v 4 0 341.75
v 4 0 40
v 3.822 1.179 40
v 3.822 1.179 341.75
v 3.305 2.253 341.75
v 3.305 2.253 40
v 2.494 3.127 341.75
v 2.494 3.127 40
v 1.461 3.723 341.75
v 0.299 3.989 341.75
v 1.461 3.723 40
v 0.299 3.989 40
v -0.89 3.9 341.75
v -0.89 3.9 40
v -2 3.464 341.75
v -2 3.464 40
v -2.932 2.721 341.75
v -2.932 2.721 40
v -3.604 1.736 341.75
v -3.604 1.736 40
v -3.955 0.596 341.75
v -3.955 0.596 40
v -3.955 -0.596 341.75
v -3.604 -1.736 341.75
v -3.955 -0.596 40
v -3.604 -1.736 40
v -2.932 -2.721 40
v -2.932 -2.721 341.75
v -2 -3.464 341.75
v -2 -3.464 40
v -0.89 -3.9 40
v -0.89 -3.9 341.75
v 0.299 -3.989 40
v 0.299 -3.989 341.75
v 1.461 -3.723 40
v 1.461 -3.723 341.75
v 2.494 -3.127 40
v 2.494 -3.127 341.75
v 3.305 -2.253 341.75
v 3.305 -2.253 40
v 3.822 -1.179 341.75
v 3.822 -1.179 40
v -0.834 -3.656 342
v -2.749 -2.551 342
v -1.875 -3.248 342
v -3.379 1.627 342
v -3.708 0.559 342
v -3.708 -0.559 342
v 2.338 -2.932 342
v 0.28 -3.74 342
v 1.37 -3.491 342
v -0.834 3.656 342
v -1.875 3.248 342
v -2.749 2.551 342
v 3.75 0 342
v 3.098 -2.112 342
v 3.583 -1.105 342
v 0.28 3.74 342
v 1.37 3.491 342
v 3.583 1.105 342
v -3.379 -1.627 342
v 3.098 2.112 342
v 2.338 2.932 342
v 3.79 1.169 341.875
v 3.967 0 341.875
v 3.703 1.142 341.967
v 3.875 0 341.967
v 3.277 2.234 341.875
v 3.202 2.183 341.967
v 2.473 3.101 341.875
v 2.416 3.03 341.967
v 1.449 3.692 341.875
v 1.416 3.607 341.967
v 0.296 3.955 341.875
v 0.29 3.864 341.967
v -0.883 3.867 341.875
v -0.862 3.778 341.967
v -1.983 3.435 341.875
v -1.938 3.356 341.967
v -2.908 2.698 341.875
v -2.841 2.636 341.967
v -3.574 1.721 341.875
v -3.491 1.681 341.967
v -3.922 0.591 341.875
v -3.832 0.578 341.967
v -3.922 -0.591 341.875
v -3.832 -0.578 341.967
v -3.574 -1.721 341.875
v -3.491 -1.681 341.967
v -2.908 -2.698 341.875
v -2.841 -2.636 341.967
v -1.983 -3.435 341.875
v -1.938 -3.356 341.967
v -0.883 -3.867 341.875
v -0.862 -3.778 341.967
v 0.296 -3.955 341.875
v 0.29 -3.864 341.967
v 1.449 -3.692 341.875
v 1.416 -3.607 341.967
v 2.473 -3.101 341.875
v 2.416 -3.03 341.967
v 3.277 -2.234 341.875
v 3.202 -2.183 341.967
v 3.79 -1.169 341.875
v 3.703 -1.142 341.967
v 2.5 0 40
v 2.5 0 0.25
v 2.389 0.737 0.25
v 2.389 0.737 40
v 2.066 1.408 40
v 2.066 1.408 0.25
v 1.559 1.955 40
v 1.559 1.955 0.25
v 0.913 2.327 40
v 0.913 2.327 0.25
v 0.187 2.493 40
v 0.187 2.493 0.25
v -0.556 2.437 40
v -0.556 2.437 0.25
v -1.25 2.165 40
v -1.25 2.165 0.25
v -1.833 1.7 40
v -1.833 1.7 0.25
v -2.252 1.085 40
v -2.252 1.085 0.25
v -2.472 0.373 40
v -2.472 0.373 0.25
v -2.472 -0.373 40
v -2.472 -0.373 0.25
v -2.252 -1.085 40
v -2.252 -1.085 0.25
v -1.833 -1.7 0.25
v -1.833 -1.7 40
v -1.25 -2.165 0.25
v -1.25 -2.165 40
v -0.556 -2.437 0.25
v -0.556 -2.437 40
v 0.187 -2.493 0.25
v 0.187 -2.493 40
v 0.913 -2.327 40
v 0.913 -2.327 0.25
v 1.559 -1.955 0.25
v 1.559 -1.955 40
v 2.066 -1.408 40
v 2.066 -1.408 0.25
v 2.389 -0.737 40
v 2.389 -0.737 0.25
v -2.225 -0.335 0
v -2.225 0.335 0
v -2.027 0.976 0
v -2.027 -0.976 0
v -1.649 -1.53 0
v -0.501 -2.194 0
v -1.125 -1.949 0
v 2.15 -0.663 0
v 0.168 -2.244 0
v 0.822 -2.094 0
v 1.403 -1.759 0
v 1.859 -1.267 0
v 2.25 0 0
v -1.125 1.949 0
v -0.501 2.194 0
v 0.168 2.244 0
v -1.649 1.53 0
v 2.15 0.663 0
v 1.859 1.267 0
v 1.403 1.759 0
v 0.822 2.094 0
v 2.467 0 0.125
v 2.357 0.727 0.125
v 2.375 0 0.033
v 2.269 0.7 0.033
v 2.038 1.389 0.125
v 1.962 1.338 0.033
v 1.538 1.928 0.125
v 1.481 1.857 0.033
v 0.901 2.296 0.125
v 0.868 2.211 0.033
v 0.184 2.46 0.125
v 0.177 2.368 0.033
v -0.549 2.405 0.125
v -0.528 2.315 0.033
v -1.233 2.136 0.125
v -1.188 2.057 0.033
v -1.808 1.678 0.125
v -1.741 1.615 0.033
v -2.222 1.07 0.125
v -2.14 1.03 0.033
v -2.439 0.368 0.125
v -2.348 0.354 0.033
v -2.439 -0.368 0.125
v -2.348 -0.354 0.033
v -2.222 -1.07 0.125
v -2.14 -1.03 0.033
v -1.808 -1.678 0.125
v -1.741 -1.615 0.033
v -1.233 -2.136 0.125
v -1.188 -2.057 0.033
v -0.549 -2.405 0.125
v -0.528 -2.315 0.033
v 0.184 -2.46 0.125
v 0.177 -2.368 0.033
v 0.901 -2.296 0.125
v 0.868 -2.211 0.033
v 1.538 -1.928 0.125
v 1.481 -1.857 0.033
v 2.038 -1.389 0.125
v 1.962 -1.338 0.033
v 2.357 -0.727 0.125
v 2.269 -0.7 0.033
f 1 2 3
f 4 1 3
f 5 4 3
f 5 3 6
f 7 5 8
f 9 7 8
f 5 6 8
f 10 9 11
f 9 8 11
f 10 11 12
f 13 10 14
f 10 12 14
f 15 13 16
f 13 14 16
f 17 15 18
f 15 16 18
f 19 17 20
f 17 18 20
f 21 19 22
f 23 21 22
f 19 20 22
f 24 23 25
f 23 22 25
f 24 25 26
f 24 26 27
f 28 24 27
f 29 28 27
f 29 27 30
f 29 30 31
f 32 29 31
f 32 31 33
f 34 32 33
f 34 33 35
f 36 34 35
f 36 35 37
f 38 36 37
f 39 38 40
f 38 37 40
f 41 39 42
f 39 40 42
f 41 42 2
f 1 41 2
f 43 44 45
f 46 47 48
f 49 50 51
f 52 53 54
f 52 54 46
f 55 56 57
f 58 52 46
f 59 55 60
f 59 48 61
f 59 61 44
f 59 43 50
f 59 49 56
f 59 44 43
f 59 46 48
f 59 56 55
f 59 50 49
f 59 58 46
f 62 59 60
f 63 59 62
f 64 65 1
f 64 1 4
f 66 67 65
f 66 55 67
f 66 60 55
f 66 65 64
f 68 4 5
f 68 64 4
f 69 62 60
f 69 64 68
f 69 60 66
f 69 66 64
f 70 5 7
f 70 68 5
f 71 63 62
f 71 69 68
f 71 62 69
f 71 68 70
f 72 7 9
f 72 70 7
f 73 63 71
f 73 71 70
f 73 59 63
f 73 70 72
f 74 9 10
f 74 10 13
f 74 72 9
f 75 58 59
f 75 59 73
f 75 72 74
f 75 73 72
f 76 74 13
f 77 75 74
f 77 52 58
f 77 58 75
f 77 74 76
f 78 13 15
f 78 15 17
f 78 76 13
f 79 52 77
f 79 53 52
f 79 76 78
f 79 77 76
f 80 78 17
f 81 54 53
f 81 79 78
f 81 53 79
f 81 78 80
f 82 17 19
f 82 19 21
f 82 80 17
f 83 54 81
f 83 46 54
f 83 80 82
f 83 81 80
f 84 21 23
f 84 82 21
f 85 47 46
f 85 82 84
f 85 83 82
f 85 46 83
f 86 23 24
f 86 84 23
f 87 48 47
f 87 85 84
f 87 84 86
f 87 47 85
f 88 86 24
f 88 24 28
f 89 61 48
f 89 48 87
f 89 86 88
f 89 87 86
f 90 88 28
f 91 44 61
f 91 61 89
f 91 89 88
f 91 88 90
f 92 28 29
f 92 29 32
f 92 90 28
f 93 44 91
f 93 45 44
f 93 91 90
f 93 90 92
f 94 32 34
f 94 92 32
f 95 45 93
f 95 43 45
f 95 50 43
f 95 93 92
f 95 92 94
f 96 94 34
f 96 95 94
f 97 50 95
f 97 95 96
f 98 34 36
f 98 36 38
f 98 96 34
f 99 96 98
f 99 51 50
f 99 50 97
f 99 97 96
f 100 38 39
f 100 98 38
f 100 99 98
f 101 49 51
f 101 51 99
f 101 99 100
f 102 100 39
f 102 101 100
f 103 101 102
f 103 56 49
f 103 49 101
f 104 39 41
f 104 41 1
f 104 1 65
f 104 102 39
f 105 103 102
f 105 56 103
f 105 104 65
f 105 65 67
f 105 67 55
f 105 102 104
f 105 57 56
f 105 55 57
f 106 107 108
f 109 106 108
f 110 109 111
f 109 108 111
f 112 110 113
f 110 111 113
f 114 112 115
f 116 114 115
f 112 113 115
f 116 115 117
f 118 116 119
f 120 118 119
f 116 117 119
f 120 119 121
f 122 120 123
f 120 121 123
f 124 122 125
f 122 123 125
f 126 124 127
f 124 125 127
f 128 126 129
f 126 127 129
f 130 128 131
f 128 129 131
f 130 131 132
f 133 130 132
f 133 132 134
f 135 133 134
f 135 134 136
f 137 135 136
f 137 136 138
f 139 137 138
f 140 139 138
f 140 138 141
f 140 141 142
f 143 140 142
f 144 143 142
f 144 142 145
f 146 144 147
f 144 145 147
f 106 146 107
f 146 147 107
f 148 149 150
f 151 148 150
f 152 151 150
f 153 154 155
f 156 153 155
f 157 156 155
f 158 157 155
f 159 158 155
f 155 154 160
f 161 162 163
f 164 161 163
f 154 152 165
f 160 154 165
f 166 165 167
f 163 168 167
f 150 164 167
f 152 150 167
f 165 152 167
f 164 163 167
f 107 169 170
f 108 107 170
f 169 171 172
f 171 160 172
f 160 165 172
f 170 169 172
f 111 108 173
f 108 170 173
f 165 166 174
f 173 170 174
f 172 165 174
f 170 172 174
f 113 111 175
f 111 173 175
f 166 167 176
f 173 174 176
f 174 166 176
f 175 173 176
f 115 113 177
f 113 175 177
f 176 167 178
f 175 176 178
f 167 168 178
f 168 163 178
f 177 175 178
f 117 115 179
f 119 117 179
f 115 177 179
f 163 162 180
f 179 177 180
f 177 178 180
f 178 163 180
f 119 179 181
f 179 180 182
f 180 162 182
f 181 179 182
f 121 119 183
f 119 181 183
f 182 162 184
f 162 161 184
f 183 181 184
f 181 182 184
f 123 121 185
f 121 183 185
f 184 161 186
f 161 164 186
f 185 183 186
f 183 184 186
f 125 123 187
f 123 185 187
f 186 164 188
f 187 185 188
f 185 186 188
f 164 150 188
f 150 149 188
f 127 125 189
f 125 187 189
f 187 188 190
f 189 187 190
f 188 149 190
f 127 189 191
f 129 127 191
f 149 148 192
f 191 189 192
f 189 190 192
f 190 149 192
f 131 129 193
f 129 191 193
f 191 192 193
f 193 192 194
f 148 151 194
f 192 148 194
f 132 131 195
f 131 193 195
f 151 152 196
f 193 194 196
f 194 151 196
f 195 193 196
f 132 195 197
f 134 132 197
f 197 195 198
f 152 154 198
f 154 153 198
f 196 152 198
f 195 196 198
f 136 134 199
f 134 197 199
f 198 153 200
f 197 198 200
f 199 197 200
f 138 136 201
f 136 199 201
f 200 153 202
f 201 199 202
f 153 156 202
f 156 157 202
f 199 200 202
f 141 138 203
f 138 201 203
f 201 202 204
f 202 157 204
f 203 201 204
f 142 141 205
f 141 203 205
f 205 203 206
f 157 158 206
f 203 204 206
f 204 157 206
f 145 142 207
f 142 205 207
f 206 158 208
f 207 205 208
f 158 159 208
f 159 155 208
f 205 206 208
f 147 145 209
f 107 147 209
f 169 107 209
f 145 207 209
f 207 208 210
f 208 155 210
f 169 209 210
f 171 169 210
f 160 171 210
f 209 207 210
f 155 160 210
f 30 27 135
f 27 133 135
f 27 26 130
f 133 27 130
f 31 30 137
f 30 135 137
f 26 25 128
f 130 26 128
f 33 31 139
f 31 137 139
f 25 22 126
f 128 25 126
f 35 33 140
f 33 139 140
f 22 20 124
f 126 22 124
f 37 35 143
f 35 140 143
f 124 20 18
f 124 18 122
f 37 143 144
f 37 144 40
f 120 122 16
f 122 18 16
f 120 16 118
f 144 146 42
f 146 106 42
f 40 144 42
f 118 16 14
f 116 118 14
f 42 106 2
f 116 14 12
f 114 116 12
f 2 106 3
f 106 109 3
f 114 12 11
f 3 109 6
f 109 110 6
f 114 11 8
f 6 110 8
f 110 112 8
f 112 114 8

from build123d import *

# Parameters (mm, degrees)
SKETCH1_R           = 2.5
EXTRUDE1_DEPTH      = 40
SKETCH2_R           = 4
BOSS_EXTRUDE1_DEPTH = 302
FILLET1_R           = 0.25


with BuildPart() as part:
    # Sketch1 → Extrude1 (new body)
    with BuildSketch(Plane.XY):
        Circle(SKETCH1_R)
    extrude(amount=EXTRUDE1_DEPTH)

    # Sketch2 → Boss-Extrude1 (add)
    with BuildSketch(Plane.XY.offset(40)):
        Circle(SKETCH2_R)
    extrude(amount=BOSS_EXTRUDE1_DEPTH)

    # Fillet1
    fillet1_edges = [part.edges().sort_by_distance(p)[0] for p in [
        (-2.5, 0, 0),
        (-4, 0, 342),
    ]]
    fillet(fillet1_edges, radius=FILLET1_R)


solid = part.part
